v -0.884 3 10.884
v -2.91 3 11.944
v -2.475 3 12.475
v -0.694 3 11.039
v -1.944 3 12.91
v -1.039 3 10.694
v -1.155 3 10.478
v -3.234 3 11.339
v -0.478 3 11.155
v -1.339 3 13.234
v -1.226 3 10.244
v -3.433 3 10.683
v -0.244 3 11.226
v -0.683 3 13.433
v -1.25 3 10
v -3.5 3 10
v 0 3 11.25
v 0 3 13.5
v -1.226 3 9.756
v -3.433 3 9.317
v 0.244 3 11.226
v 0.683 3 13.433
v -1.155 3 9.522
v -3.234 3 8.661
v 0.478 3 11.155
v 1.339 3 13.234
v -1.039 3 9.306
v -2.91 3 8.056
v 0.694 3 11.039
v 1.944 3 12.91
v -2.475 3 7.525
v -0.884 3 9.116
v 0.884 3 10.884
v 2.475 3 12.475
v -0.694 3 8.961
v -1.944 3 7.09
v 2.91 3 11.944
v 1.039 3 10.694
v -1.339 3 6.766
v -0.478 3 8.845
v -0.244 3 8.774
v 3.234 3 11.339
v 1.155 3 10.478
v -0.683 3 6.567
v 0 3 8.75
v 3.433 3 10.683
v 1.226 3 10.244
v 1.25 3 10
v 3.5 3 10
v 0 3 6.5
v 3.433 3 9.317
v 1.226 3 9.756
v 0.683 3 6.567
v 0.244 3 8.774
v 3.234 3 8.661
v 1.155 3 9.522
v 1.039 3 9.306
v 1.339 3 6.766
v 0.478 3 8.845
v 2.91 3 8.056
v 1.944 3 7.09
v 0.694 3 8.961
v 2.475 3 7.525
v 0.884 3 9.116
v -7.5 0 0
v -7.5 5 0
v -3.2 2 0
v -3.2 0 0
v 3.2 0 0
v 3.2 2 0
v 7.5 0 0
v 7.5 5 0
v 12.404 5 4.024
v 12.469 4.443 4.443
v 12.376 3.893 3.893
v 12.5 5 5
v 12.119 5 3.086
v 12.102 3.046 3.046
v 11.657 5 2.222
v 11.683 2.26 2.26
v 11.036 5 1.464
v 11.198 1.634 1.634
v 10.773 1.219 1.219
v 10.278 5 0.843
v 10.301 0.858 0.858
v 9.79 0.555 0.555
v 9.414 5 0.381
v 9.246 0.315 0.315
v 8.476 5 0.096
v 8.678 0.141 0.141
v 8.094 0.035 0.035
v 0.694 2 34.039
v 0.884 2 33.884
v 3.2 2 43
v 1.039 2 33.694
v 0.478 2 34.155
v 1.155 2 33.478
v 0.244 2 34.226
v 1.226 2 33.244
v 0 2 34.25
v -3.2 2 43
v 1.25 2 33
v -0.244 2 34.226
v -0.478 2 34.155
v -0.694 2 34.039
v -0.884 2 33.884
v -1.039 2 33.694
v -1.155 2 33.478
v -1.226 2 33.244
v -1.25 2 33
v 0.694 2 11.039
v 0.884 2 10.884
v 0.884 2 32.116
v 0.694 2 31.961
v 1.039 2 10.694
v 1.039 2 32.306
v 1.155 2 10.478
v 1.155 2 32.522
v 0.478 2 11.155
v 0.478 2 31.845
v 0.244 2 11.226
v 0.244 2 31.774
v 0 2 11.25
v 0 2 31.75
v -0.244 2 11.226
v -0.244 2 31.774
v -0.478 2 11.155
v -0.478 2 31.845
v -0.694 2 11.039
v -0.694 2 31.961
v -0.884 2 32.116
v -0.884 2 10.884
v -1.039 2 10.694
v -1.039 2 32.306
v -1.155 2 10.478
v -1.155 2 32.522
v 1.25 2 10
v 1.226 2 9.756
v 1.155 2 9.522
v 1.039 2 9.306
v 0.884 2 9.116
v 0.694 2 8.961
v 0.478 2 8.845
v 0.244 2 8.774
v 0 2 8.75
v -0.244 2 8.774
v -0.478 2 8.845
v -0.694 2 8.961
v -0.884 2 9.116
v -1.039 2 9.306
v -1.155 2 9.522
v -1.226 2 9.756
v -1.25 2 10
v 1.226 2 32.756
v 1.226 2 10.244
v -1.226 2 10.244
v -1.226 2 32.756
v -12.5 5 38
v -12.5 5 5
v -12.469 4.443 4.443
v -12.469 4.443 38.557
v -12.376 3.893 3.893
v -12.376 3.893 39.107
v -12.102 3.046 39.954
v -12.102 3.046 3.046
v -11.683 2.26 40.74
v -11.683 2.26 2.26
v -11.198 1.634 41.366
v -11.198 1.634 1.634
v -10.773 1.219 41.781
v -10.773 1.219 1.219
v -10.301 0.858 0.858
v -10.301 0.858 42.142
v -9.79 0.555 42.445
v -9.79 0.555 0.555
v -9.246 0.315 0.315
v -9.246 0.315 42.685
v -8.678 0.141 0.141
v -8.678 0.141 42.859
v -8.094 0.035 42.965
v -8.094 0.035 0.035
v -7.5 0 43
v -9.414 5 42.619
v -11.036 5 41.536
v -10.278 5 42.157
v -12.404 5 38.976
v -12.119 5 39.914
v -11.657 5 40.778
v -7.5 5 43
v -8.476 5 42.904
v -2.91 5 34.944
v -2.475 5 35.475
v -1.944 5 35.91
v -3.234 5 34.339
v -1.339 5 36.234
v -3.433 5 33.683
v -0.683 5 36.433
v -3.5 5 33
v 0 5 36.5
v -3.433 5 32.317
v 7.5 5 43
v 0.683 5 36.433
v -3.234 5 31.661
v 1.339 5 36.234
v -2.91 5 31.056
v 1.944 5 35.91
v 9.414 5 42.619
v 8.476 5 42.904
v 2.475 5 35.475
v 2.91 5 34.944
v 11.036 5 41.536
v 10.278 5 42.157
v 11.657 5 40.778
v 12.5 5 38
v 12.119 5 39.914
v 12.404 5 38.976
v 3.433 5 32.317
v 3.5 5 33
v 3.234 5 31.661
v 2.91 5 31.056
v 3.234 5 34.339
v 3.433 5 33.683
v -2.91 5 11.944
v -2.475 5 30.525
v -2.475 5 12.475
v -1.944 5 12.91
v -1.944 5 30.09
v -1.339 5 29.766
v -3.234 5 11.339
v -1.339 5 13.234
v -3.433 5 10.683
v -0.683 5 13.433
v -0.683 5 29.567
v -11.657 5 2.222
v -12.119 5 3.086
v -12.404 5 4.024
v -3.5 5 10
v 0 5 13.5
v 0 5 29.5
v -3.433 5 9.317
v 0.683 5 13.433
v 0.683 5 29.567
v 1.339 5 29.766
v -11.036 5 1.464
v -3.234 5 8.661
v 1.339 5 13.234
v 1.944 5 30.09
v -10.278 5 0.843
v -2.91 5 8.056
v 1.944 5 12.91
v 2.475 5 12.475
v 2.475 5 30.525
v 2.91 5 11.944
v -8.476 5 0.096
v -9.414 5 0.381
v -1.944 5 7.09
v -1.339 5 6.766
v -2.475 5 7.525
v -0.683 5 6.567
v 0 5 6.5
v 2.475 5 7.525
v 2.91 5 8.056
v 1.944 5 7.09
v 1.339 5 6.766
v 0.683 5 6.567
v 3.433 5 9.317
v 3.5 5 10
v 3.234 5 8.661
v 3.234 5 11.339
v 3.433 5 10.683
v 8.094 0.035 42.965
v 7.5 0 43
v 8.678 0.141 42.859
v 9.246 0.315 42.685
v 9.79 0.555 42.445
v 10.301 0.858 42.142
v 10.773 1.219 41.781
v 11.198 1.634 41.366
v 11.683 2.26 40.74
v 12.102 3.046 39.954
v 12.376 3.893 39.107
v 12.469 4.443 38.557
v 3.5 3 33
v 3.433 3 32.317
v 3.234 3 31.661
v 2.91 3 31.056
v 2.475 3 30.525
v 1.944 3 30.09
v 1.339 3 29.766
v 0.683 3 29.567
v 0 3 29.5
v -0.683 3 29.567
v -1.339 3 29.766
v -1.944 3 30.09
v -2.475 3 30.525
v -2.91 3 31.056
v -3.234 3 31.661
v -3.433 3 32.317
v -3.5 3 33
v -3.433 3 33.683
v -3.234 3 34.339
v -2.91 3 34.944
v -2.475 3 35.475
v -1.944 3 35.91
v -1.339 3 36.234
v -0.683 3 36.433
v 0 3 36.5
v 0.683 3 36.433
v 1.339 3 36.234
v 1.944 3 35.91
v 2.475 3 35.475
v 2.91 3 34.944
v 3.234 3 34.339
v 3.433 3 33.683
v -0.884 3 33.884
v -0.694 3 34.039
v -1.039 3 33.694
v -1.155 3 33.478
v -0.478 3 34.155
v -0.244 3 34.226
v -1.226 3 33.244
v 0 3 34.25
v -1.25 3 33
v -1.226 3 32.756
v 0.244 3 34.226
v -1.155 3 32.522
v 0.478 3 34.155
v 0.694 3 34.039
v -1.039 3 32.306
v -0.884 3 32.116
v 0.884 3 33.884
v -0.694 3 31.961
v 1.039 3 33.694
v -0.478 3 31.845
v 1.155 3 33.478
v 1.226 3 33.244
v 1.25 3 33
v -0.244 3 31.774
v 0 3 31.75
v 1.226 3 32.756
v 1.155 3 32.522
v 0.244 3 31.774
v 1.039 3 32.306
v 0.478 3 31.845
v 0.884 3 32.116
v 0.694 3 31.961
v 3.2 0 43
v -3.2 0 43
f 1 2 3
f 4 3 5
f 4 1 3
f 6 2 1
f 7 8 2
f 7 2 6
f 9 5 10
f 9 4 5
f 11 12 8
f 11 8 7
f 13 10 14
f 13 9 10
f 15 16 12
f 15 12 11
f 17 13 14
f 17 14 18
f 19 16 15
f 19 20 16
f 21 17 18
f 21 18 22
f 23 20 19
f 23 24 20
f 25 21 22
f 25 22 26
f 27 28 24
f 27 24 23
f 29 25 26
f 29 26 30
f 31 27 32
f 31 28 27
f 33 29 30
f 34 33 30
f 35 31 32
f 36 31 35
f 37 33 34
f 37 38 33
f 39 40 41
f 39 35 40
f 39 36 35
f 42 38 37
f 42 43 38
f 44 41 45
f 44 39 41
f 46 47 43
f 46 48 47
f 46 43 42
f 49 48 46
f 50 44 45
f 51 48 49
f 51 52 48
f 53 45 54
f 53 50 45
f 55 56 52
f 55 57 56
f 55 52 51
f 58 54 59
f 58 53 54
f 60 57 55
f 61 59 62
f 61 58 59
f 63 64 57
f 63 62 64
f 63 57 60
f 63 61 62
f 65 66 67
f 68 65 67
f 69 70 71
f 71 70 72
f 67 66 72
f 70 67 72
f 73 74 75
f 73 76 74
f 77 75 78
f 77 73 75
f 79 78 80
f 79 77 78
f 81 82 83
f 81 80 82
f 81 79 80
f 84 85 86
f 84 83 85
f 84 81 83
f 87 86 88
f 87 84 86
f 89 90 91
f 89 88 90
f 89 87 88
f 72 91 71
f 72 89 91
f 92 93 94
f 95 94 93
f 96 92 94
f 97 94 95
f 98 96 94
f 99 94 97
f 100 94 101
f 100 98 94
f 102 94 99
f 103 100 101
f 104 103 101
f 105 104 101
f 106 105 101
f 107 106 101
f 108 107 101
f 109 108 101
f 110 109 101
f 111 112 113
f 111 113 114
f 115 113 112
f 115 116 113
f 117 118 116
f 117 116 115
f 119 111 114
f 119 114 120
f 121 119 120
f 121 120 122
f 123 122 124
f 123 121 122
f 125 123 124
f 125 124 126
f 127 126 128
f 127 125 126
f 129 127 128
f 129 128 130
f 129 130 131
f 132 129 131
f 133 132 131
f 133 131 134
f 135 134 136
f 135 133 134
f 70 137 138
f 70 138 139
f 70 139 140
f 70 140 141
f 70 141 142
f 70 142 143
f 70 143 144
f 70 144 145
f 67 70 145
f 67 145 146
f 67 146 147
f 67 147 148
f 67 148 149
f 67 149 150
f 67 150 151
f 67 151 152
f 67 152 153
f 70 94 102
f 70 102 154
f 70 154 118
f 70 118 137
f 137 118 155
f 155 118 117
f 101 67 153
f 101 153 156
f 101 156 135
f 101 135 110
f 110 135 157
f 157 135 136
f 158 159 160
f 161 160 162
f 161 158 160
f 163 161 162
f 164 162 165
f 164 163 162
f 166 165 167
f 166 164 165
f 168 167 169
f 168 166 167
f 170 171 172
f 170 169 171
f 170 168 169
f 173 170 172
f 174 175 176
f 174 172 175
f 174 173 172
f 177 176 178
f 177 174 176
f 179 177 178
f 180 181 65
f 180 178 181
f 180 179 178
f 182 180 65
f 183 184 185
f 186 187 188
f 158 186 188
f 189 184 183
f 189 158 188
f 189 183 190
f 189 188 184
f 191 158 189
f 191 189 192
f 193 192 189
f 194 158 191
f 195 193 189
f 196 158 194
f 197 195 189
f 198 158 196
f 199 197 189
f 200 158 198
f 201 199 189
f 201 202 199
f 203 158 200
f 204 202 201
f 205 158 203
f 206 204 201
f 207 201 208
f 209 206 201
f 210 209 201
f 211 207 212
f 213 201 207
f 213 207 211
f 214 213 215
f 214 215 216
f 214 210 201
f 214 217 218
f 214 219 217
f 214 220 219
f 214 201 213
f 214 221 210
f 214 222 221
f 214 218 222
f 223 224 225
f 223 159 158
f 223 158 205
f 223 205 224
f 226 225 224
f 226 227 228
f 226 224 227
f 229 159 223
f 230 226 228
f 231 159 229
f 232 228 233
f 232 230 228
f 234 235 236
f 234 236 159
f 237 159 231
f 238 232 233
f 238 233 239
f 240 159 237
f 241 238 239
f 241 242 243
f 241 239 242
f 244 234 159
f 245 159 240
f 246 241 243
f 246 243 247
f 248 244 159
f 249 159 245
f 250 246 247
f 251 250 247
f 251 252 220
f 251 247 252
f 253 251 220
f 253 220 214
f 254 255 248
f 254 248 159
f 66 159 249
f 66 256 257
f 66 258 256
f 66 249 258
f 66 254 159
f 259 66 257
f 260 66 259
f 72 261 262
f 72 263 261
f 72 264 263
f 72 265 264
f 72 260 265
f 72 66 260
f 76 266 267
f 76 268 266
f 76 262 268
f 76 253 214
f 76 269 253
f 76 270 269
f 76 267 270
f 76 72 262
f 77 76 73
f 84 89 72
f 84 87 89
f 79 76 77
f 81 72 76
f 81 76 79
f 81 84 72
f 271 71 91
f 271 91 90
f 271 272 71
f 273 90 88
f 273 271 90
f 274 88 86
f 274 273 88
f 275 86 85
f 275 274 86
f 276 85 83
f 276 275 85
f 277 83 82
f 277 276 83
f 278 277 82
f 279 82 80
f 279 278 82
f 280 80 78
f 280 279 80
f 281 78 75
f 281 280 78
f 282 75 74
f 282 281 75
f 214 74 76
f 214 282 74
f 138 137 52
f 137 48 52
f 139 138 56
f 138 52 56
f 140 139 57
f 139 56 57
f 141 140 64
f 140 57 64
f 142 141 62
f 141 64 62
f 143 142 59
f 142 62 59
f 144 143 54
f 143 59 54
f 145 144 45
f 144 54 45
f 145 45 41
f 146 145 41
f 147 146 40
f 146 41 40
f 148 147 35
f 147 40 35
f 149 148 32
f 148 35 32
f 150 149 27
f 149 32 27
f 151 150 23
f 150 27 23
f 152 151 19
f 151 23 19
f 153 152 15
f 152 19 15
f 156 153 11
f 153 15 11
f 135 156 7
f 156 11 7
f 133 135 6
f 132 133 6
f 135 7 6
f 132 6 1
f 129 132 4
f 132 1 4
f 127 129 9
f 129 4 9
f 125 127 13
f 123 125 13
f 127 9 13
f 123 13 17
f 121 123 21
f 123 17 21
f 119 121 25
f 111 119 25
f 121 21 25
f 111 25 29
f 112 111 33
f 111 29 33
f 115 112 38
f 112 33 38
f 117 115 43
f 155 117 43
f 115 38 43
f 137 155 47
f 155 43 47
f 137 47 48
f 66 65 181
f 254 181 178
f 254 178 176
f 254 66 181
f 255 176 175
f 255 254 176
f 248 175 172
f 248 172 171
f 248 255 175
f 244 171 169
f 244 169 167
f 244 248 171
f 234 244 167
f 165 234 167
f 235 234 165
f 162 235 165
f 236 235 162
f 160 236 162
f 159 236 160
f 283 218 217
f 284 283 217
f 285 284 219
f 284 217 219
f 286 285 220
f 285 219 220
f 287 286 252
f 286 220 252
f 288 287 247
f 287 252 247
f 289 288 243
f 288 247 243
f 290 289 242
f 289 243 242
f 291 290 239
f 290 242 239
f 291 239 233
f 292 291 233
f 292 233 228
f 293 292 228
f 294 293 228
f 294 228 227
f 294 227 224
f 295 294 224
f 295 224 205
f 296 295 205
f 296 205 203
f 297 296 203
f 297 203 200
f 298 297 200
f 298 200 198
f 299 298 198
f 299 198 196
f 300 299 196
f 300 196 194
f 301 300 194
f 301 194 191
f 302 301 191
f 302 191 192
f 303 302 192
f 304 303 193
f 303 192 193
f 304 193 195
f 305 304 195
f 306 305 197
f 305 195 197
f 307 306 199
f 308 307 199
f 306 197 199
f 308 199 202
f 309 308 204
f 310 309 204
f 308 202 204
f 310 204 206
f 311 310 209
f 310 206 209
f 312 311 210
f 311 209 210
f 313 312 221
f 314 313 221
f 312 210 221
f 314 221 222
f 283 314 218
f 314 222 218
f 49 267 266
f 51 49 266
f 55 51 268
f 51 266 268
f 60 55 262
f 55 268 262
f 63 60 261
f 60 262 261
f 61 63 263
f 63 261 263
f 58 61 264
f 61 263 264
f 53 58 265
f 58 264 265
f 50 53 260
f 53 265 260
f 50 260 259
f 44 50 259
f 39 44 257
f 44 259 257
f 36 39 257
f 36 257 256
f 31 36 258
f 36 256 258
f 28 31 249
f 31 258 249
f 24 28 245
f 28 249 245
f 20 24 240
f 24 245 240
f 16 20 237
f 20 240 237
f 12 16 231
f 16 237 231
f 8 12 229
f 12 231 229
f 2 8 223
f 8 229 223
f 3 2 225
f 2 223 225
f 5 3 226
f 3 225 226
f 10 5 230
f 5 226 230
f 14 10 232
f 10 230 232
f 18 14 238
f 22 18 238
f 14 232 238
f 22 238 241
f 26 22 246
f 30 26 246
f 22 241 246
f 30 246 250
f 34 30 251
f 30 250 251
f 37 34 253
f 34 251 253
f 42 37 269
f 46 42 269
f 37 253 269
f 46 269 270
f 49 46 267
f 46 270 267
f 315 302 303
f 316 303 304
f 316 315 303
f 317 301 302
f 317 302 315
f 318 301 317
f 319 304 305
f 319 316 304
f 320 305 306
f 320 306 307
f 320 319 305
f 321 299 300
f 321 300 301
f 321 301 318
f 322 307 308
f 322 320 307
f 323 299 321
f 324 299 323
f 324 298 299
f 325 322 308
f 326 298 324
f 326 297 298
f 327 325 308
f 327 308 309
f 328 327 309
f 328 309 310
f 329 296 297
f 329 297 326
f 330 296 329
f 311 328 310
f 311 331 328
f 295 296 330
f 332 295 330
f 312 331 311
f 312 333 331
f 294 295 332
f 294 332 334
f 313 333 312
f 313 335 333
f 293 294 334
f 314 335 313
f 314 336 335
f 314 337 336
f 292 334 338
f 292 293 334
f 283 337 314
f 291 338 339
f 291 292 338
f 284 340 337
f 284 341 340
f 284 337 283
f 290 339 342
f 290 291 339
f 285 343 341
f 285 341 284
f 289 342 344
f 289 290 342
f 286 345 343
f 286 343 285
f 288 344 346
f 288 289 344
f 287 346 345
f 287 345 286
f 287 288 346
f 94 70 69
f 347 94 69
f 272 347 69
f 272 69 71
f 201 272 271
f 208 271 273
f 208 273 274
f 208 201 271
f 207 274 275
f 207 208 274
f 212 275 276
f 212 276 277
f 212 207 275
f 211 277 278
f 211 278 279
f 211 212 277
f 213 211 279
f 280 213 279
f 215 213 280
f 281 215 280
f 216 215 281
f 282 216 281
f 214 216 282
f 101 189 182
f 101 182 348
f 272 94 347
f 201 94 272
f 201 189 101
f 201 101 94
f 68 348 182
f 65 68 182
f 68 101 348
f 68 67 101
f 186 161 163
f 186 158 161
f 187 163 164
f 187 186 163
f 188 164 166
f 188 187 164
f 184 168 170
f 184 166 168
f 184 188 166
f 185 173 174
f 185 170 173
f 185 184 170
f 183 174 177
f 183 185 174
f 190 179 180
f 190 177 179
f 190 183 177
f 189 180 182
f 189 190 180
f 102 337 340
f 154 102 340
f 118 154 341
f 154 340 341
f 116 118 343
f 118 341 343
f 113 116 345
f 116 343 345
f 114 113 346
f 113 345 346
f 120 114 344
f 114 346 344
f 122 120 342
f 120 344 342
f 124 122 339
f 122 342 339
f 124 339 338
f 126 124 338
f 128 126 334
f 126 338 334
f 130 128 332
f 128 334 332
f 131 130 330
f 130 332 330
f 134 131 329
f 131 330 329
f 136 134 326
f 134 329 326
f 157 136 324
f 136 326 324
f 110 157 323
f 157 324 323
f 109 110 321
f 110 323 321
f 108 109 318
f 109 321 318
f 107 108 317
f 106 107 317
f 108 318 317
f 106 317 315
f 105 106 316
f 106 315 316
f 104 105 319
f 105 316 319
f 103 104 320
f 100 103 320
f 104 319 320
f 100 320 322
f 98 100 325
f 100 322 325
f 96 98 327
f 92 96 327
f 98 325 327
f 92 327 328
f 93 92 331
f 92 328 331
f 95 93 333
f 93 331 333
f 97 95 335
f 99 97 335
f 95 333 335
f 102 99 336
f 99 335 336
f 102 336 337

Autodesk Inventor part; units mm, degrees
ref_plane "YZ Plane" through (0, 0, 0) normal (1, 0, 0) x (0, 1, 0)
ref_plane "XZ Plane" through (0, 0, 0) normal (0, 1, 0) x (-1, 0, 0)
ref_plane "XY Plane" through (0, 0, 0) normal (0, 0, 1) x (1, 0, 0)
sketch "Sketch1" plane through (0, 0, 0) normal (0, 0, 1) x (1, 0, 0)
  line L0 (0, 2) -> (3.2, 2)
  line L1 (3.2, 2) -> (3.2, 0)
  line L2 (3.2, 0) -> (12.5, 0)
  line L3 (12.5, 0) -> (12.5, 5)
  line L4 (12.5, 5) -> (0, 5)
  line L5 (0, 0) -> (0, 5) construction
  line L6 (0, 2) -> (-3.2, 2)
  line L7 (-3.2, 2) -> (-3.2, 0)
  line L8 (-3.2, 0) -> (-12.5, 0)
  line L9 (-12.5, 0) -> (-12.5, 5)
  line L10 (-12.5, 5) -> (0, 5)
  dimension "d0" = 3.2
  dimension "d1" = 2
  dimension "d2" = 9.3
  dimension "d3" = 5
extrude "Extrusion1" add sketch "Sketch1" along normal blind 43
sketch "Sketch2" plane through (-12.5, 5, 0) normal (0, 1, 0) x (1, 0, 0)
  circle A0 centre (12.5, -33) radius 1.25
  circle A1 centre (12.5, -10) radius 1.25
  line L0 (25, 0) -> (0, 0) projected
  line L1 (25, -43) -> (0, -43) projected
  point P0 (12.5, 0)
  dimension "d6" = 2.5
  dimension "d7" = 2.5
  dimension "d8" = 10
  dimension "d9" = 10
extrude "Extrusion2" cut sketch "Sketch2" against normal up to surface (3 mm away)
sketch "Sketch3" plane through (-12.5, 5, 0) normal (0, 1, 0) x (1, 0, 0)
  circle A0 centre (12.5, -33) radius 1.25 projected
  circle A1 centre (12.5, -33) radius 3.5
  circle A2 centre (12.5, -10) radius 1.25 projected
  circle A3 centre (12.5, -10) radius 3.5
  point P0 (12.5, 0)
  dimension "d12" = 7
  dimension "d13" = 7
extrude "Extrusion3" cut sketch "Sketch3" against normal blind 2
fillet "Fillet1" radius 5 6 edges at (-12.5, 2.5, 0) (12.5, 2.5, 0) (12.5, 2.5, 43) (-12.5, 2.5, 43) (12.5, 0, 21.5) (-12.5, 0, 21.5)
properties part number "Gripper 5-4"
